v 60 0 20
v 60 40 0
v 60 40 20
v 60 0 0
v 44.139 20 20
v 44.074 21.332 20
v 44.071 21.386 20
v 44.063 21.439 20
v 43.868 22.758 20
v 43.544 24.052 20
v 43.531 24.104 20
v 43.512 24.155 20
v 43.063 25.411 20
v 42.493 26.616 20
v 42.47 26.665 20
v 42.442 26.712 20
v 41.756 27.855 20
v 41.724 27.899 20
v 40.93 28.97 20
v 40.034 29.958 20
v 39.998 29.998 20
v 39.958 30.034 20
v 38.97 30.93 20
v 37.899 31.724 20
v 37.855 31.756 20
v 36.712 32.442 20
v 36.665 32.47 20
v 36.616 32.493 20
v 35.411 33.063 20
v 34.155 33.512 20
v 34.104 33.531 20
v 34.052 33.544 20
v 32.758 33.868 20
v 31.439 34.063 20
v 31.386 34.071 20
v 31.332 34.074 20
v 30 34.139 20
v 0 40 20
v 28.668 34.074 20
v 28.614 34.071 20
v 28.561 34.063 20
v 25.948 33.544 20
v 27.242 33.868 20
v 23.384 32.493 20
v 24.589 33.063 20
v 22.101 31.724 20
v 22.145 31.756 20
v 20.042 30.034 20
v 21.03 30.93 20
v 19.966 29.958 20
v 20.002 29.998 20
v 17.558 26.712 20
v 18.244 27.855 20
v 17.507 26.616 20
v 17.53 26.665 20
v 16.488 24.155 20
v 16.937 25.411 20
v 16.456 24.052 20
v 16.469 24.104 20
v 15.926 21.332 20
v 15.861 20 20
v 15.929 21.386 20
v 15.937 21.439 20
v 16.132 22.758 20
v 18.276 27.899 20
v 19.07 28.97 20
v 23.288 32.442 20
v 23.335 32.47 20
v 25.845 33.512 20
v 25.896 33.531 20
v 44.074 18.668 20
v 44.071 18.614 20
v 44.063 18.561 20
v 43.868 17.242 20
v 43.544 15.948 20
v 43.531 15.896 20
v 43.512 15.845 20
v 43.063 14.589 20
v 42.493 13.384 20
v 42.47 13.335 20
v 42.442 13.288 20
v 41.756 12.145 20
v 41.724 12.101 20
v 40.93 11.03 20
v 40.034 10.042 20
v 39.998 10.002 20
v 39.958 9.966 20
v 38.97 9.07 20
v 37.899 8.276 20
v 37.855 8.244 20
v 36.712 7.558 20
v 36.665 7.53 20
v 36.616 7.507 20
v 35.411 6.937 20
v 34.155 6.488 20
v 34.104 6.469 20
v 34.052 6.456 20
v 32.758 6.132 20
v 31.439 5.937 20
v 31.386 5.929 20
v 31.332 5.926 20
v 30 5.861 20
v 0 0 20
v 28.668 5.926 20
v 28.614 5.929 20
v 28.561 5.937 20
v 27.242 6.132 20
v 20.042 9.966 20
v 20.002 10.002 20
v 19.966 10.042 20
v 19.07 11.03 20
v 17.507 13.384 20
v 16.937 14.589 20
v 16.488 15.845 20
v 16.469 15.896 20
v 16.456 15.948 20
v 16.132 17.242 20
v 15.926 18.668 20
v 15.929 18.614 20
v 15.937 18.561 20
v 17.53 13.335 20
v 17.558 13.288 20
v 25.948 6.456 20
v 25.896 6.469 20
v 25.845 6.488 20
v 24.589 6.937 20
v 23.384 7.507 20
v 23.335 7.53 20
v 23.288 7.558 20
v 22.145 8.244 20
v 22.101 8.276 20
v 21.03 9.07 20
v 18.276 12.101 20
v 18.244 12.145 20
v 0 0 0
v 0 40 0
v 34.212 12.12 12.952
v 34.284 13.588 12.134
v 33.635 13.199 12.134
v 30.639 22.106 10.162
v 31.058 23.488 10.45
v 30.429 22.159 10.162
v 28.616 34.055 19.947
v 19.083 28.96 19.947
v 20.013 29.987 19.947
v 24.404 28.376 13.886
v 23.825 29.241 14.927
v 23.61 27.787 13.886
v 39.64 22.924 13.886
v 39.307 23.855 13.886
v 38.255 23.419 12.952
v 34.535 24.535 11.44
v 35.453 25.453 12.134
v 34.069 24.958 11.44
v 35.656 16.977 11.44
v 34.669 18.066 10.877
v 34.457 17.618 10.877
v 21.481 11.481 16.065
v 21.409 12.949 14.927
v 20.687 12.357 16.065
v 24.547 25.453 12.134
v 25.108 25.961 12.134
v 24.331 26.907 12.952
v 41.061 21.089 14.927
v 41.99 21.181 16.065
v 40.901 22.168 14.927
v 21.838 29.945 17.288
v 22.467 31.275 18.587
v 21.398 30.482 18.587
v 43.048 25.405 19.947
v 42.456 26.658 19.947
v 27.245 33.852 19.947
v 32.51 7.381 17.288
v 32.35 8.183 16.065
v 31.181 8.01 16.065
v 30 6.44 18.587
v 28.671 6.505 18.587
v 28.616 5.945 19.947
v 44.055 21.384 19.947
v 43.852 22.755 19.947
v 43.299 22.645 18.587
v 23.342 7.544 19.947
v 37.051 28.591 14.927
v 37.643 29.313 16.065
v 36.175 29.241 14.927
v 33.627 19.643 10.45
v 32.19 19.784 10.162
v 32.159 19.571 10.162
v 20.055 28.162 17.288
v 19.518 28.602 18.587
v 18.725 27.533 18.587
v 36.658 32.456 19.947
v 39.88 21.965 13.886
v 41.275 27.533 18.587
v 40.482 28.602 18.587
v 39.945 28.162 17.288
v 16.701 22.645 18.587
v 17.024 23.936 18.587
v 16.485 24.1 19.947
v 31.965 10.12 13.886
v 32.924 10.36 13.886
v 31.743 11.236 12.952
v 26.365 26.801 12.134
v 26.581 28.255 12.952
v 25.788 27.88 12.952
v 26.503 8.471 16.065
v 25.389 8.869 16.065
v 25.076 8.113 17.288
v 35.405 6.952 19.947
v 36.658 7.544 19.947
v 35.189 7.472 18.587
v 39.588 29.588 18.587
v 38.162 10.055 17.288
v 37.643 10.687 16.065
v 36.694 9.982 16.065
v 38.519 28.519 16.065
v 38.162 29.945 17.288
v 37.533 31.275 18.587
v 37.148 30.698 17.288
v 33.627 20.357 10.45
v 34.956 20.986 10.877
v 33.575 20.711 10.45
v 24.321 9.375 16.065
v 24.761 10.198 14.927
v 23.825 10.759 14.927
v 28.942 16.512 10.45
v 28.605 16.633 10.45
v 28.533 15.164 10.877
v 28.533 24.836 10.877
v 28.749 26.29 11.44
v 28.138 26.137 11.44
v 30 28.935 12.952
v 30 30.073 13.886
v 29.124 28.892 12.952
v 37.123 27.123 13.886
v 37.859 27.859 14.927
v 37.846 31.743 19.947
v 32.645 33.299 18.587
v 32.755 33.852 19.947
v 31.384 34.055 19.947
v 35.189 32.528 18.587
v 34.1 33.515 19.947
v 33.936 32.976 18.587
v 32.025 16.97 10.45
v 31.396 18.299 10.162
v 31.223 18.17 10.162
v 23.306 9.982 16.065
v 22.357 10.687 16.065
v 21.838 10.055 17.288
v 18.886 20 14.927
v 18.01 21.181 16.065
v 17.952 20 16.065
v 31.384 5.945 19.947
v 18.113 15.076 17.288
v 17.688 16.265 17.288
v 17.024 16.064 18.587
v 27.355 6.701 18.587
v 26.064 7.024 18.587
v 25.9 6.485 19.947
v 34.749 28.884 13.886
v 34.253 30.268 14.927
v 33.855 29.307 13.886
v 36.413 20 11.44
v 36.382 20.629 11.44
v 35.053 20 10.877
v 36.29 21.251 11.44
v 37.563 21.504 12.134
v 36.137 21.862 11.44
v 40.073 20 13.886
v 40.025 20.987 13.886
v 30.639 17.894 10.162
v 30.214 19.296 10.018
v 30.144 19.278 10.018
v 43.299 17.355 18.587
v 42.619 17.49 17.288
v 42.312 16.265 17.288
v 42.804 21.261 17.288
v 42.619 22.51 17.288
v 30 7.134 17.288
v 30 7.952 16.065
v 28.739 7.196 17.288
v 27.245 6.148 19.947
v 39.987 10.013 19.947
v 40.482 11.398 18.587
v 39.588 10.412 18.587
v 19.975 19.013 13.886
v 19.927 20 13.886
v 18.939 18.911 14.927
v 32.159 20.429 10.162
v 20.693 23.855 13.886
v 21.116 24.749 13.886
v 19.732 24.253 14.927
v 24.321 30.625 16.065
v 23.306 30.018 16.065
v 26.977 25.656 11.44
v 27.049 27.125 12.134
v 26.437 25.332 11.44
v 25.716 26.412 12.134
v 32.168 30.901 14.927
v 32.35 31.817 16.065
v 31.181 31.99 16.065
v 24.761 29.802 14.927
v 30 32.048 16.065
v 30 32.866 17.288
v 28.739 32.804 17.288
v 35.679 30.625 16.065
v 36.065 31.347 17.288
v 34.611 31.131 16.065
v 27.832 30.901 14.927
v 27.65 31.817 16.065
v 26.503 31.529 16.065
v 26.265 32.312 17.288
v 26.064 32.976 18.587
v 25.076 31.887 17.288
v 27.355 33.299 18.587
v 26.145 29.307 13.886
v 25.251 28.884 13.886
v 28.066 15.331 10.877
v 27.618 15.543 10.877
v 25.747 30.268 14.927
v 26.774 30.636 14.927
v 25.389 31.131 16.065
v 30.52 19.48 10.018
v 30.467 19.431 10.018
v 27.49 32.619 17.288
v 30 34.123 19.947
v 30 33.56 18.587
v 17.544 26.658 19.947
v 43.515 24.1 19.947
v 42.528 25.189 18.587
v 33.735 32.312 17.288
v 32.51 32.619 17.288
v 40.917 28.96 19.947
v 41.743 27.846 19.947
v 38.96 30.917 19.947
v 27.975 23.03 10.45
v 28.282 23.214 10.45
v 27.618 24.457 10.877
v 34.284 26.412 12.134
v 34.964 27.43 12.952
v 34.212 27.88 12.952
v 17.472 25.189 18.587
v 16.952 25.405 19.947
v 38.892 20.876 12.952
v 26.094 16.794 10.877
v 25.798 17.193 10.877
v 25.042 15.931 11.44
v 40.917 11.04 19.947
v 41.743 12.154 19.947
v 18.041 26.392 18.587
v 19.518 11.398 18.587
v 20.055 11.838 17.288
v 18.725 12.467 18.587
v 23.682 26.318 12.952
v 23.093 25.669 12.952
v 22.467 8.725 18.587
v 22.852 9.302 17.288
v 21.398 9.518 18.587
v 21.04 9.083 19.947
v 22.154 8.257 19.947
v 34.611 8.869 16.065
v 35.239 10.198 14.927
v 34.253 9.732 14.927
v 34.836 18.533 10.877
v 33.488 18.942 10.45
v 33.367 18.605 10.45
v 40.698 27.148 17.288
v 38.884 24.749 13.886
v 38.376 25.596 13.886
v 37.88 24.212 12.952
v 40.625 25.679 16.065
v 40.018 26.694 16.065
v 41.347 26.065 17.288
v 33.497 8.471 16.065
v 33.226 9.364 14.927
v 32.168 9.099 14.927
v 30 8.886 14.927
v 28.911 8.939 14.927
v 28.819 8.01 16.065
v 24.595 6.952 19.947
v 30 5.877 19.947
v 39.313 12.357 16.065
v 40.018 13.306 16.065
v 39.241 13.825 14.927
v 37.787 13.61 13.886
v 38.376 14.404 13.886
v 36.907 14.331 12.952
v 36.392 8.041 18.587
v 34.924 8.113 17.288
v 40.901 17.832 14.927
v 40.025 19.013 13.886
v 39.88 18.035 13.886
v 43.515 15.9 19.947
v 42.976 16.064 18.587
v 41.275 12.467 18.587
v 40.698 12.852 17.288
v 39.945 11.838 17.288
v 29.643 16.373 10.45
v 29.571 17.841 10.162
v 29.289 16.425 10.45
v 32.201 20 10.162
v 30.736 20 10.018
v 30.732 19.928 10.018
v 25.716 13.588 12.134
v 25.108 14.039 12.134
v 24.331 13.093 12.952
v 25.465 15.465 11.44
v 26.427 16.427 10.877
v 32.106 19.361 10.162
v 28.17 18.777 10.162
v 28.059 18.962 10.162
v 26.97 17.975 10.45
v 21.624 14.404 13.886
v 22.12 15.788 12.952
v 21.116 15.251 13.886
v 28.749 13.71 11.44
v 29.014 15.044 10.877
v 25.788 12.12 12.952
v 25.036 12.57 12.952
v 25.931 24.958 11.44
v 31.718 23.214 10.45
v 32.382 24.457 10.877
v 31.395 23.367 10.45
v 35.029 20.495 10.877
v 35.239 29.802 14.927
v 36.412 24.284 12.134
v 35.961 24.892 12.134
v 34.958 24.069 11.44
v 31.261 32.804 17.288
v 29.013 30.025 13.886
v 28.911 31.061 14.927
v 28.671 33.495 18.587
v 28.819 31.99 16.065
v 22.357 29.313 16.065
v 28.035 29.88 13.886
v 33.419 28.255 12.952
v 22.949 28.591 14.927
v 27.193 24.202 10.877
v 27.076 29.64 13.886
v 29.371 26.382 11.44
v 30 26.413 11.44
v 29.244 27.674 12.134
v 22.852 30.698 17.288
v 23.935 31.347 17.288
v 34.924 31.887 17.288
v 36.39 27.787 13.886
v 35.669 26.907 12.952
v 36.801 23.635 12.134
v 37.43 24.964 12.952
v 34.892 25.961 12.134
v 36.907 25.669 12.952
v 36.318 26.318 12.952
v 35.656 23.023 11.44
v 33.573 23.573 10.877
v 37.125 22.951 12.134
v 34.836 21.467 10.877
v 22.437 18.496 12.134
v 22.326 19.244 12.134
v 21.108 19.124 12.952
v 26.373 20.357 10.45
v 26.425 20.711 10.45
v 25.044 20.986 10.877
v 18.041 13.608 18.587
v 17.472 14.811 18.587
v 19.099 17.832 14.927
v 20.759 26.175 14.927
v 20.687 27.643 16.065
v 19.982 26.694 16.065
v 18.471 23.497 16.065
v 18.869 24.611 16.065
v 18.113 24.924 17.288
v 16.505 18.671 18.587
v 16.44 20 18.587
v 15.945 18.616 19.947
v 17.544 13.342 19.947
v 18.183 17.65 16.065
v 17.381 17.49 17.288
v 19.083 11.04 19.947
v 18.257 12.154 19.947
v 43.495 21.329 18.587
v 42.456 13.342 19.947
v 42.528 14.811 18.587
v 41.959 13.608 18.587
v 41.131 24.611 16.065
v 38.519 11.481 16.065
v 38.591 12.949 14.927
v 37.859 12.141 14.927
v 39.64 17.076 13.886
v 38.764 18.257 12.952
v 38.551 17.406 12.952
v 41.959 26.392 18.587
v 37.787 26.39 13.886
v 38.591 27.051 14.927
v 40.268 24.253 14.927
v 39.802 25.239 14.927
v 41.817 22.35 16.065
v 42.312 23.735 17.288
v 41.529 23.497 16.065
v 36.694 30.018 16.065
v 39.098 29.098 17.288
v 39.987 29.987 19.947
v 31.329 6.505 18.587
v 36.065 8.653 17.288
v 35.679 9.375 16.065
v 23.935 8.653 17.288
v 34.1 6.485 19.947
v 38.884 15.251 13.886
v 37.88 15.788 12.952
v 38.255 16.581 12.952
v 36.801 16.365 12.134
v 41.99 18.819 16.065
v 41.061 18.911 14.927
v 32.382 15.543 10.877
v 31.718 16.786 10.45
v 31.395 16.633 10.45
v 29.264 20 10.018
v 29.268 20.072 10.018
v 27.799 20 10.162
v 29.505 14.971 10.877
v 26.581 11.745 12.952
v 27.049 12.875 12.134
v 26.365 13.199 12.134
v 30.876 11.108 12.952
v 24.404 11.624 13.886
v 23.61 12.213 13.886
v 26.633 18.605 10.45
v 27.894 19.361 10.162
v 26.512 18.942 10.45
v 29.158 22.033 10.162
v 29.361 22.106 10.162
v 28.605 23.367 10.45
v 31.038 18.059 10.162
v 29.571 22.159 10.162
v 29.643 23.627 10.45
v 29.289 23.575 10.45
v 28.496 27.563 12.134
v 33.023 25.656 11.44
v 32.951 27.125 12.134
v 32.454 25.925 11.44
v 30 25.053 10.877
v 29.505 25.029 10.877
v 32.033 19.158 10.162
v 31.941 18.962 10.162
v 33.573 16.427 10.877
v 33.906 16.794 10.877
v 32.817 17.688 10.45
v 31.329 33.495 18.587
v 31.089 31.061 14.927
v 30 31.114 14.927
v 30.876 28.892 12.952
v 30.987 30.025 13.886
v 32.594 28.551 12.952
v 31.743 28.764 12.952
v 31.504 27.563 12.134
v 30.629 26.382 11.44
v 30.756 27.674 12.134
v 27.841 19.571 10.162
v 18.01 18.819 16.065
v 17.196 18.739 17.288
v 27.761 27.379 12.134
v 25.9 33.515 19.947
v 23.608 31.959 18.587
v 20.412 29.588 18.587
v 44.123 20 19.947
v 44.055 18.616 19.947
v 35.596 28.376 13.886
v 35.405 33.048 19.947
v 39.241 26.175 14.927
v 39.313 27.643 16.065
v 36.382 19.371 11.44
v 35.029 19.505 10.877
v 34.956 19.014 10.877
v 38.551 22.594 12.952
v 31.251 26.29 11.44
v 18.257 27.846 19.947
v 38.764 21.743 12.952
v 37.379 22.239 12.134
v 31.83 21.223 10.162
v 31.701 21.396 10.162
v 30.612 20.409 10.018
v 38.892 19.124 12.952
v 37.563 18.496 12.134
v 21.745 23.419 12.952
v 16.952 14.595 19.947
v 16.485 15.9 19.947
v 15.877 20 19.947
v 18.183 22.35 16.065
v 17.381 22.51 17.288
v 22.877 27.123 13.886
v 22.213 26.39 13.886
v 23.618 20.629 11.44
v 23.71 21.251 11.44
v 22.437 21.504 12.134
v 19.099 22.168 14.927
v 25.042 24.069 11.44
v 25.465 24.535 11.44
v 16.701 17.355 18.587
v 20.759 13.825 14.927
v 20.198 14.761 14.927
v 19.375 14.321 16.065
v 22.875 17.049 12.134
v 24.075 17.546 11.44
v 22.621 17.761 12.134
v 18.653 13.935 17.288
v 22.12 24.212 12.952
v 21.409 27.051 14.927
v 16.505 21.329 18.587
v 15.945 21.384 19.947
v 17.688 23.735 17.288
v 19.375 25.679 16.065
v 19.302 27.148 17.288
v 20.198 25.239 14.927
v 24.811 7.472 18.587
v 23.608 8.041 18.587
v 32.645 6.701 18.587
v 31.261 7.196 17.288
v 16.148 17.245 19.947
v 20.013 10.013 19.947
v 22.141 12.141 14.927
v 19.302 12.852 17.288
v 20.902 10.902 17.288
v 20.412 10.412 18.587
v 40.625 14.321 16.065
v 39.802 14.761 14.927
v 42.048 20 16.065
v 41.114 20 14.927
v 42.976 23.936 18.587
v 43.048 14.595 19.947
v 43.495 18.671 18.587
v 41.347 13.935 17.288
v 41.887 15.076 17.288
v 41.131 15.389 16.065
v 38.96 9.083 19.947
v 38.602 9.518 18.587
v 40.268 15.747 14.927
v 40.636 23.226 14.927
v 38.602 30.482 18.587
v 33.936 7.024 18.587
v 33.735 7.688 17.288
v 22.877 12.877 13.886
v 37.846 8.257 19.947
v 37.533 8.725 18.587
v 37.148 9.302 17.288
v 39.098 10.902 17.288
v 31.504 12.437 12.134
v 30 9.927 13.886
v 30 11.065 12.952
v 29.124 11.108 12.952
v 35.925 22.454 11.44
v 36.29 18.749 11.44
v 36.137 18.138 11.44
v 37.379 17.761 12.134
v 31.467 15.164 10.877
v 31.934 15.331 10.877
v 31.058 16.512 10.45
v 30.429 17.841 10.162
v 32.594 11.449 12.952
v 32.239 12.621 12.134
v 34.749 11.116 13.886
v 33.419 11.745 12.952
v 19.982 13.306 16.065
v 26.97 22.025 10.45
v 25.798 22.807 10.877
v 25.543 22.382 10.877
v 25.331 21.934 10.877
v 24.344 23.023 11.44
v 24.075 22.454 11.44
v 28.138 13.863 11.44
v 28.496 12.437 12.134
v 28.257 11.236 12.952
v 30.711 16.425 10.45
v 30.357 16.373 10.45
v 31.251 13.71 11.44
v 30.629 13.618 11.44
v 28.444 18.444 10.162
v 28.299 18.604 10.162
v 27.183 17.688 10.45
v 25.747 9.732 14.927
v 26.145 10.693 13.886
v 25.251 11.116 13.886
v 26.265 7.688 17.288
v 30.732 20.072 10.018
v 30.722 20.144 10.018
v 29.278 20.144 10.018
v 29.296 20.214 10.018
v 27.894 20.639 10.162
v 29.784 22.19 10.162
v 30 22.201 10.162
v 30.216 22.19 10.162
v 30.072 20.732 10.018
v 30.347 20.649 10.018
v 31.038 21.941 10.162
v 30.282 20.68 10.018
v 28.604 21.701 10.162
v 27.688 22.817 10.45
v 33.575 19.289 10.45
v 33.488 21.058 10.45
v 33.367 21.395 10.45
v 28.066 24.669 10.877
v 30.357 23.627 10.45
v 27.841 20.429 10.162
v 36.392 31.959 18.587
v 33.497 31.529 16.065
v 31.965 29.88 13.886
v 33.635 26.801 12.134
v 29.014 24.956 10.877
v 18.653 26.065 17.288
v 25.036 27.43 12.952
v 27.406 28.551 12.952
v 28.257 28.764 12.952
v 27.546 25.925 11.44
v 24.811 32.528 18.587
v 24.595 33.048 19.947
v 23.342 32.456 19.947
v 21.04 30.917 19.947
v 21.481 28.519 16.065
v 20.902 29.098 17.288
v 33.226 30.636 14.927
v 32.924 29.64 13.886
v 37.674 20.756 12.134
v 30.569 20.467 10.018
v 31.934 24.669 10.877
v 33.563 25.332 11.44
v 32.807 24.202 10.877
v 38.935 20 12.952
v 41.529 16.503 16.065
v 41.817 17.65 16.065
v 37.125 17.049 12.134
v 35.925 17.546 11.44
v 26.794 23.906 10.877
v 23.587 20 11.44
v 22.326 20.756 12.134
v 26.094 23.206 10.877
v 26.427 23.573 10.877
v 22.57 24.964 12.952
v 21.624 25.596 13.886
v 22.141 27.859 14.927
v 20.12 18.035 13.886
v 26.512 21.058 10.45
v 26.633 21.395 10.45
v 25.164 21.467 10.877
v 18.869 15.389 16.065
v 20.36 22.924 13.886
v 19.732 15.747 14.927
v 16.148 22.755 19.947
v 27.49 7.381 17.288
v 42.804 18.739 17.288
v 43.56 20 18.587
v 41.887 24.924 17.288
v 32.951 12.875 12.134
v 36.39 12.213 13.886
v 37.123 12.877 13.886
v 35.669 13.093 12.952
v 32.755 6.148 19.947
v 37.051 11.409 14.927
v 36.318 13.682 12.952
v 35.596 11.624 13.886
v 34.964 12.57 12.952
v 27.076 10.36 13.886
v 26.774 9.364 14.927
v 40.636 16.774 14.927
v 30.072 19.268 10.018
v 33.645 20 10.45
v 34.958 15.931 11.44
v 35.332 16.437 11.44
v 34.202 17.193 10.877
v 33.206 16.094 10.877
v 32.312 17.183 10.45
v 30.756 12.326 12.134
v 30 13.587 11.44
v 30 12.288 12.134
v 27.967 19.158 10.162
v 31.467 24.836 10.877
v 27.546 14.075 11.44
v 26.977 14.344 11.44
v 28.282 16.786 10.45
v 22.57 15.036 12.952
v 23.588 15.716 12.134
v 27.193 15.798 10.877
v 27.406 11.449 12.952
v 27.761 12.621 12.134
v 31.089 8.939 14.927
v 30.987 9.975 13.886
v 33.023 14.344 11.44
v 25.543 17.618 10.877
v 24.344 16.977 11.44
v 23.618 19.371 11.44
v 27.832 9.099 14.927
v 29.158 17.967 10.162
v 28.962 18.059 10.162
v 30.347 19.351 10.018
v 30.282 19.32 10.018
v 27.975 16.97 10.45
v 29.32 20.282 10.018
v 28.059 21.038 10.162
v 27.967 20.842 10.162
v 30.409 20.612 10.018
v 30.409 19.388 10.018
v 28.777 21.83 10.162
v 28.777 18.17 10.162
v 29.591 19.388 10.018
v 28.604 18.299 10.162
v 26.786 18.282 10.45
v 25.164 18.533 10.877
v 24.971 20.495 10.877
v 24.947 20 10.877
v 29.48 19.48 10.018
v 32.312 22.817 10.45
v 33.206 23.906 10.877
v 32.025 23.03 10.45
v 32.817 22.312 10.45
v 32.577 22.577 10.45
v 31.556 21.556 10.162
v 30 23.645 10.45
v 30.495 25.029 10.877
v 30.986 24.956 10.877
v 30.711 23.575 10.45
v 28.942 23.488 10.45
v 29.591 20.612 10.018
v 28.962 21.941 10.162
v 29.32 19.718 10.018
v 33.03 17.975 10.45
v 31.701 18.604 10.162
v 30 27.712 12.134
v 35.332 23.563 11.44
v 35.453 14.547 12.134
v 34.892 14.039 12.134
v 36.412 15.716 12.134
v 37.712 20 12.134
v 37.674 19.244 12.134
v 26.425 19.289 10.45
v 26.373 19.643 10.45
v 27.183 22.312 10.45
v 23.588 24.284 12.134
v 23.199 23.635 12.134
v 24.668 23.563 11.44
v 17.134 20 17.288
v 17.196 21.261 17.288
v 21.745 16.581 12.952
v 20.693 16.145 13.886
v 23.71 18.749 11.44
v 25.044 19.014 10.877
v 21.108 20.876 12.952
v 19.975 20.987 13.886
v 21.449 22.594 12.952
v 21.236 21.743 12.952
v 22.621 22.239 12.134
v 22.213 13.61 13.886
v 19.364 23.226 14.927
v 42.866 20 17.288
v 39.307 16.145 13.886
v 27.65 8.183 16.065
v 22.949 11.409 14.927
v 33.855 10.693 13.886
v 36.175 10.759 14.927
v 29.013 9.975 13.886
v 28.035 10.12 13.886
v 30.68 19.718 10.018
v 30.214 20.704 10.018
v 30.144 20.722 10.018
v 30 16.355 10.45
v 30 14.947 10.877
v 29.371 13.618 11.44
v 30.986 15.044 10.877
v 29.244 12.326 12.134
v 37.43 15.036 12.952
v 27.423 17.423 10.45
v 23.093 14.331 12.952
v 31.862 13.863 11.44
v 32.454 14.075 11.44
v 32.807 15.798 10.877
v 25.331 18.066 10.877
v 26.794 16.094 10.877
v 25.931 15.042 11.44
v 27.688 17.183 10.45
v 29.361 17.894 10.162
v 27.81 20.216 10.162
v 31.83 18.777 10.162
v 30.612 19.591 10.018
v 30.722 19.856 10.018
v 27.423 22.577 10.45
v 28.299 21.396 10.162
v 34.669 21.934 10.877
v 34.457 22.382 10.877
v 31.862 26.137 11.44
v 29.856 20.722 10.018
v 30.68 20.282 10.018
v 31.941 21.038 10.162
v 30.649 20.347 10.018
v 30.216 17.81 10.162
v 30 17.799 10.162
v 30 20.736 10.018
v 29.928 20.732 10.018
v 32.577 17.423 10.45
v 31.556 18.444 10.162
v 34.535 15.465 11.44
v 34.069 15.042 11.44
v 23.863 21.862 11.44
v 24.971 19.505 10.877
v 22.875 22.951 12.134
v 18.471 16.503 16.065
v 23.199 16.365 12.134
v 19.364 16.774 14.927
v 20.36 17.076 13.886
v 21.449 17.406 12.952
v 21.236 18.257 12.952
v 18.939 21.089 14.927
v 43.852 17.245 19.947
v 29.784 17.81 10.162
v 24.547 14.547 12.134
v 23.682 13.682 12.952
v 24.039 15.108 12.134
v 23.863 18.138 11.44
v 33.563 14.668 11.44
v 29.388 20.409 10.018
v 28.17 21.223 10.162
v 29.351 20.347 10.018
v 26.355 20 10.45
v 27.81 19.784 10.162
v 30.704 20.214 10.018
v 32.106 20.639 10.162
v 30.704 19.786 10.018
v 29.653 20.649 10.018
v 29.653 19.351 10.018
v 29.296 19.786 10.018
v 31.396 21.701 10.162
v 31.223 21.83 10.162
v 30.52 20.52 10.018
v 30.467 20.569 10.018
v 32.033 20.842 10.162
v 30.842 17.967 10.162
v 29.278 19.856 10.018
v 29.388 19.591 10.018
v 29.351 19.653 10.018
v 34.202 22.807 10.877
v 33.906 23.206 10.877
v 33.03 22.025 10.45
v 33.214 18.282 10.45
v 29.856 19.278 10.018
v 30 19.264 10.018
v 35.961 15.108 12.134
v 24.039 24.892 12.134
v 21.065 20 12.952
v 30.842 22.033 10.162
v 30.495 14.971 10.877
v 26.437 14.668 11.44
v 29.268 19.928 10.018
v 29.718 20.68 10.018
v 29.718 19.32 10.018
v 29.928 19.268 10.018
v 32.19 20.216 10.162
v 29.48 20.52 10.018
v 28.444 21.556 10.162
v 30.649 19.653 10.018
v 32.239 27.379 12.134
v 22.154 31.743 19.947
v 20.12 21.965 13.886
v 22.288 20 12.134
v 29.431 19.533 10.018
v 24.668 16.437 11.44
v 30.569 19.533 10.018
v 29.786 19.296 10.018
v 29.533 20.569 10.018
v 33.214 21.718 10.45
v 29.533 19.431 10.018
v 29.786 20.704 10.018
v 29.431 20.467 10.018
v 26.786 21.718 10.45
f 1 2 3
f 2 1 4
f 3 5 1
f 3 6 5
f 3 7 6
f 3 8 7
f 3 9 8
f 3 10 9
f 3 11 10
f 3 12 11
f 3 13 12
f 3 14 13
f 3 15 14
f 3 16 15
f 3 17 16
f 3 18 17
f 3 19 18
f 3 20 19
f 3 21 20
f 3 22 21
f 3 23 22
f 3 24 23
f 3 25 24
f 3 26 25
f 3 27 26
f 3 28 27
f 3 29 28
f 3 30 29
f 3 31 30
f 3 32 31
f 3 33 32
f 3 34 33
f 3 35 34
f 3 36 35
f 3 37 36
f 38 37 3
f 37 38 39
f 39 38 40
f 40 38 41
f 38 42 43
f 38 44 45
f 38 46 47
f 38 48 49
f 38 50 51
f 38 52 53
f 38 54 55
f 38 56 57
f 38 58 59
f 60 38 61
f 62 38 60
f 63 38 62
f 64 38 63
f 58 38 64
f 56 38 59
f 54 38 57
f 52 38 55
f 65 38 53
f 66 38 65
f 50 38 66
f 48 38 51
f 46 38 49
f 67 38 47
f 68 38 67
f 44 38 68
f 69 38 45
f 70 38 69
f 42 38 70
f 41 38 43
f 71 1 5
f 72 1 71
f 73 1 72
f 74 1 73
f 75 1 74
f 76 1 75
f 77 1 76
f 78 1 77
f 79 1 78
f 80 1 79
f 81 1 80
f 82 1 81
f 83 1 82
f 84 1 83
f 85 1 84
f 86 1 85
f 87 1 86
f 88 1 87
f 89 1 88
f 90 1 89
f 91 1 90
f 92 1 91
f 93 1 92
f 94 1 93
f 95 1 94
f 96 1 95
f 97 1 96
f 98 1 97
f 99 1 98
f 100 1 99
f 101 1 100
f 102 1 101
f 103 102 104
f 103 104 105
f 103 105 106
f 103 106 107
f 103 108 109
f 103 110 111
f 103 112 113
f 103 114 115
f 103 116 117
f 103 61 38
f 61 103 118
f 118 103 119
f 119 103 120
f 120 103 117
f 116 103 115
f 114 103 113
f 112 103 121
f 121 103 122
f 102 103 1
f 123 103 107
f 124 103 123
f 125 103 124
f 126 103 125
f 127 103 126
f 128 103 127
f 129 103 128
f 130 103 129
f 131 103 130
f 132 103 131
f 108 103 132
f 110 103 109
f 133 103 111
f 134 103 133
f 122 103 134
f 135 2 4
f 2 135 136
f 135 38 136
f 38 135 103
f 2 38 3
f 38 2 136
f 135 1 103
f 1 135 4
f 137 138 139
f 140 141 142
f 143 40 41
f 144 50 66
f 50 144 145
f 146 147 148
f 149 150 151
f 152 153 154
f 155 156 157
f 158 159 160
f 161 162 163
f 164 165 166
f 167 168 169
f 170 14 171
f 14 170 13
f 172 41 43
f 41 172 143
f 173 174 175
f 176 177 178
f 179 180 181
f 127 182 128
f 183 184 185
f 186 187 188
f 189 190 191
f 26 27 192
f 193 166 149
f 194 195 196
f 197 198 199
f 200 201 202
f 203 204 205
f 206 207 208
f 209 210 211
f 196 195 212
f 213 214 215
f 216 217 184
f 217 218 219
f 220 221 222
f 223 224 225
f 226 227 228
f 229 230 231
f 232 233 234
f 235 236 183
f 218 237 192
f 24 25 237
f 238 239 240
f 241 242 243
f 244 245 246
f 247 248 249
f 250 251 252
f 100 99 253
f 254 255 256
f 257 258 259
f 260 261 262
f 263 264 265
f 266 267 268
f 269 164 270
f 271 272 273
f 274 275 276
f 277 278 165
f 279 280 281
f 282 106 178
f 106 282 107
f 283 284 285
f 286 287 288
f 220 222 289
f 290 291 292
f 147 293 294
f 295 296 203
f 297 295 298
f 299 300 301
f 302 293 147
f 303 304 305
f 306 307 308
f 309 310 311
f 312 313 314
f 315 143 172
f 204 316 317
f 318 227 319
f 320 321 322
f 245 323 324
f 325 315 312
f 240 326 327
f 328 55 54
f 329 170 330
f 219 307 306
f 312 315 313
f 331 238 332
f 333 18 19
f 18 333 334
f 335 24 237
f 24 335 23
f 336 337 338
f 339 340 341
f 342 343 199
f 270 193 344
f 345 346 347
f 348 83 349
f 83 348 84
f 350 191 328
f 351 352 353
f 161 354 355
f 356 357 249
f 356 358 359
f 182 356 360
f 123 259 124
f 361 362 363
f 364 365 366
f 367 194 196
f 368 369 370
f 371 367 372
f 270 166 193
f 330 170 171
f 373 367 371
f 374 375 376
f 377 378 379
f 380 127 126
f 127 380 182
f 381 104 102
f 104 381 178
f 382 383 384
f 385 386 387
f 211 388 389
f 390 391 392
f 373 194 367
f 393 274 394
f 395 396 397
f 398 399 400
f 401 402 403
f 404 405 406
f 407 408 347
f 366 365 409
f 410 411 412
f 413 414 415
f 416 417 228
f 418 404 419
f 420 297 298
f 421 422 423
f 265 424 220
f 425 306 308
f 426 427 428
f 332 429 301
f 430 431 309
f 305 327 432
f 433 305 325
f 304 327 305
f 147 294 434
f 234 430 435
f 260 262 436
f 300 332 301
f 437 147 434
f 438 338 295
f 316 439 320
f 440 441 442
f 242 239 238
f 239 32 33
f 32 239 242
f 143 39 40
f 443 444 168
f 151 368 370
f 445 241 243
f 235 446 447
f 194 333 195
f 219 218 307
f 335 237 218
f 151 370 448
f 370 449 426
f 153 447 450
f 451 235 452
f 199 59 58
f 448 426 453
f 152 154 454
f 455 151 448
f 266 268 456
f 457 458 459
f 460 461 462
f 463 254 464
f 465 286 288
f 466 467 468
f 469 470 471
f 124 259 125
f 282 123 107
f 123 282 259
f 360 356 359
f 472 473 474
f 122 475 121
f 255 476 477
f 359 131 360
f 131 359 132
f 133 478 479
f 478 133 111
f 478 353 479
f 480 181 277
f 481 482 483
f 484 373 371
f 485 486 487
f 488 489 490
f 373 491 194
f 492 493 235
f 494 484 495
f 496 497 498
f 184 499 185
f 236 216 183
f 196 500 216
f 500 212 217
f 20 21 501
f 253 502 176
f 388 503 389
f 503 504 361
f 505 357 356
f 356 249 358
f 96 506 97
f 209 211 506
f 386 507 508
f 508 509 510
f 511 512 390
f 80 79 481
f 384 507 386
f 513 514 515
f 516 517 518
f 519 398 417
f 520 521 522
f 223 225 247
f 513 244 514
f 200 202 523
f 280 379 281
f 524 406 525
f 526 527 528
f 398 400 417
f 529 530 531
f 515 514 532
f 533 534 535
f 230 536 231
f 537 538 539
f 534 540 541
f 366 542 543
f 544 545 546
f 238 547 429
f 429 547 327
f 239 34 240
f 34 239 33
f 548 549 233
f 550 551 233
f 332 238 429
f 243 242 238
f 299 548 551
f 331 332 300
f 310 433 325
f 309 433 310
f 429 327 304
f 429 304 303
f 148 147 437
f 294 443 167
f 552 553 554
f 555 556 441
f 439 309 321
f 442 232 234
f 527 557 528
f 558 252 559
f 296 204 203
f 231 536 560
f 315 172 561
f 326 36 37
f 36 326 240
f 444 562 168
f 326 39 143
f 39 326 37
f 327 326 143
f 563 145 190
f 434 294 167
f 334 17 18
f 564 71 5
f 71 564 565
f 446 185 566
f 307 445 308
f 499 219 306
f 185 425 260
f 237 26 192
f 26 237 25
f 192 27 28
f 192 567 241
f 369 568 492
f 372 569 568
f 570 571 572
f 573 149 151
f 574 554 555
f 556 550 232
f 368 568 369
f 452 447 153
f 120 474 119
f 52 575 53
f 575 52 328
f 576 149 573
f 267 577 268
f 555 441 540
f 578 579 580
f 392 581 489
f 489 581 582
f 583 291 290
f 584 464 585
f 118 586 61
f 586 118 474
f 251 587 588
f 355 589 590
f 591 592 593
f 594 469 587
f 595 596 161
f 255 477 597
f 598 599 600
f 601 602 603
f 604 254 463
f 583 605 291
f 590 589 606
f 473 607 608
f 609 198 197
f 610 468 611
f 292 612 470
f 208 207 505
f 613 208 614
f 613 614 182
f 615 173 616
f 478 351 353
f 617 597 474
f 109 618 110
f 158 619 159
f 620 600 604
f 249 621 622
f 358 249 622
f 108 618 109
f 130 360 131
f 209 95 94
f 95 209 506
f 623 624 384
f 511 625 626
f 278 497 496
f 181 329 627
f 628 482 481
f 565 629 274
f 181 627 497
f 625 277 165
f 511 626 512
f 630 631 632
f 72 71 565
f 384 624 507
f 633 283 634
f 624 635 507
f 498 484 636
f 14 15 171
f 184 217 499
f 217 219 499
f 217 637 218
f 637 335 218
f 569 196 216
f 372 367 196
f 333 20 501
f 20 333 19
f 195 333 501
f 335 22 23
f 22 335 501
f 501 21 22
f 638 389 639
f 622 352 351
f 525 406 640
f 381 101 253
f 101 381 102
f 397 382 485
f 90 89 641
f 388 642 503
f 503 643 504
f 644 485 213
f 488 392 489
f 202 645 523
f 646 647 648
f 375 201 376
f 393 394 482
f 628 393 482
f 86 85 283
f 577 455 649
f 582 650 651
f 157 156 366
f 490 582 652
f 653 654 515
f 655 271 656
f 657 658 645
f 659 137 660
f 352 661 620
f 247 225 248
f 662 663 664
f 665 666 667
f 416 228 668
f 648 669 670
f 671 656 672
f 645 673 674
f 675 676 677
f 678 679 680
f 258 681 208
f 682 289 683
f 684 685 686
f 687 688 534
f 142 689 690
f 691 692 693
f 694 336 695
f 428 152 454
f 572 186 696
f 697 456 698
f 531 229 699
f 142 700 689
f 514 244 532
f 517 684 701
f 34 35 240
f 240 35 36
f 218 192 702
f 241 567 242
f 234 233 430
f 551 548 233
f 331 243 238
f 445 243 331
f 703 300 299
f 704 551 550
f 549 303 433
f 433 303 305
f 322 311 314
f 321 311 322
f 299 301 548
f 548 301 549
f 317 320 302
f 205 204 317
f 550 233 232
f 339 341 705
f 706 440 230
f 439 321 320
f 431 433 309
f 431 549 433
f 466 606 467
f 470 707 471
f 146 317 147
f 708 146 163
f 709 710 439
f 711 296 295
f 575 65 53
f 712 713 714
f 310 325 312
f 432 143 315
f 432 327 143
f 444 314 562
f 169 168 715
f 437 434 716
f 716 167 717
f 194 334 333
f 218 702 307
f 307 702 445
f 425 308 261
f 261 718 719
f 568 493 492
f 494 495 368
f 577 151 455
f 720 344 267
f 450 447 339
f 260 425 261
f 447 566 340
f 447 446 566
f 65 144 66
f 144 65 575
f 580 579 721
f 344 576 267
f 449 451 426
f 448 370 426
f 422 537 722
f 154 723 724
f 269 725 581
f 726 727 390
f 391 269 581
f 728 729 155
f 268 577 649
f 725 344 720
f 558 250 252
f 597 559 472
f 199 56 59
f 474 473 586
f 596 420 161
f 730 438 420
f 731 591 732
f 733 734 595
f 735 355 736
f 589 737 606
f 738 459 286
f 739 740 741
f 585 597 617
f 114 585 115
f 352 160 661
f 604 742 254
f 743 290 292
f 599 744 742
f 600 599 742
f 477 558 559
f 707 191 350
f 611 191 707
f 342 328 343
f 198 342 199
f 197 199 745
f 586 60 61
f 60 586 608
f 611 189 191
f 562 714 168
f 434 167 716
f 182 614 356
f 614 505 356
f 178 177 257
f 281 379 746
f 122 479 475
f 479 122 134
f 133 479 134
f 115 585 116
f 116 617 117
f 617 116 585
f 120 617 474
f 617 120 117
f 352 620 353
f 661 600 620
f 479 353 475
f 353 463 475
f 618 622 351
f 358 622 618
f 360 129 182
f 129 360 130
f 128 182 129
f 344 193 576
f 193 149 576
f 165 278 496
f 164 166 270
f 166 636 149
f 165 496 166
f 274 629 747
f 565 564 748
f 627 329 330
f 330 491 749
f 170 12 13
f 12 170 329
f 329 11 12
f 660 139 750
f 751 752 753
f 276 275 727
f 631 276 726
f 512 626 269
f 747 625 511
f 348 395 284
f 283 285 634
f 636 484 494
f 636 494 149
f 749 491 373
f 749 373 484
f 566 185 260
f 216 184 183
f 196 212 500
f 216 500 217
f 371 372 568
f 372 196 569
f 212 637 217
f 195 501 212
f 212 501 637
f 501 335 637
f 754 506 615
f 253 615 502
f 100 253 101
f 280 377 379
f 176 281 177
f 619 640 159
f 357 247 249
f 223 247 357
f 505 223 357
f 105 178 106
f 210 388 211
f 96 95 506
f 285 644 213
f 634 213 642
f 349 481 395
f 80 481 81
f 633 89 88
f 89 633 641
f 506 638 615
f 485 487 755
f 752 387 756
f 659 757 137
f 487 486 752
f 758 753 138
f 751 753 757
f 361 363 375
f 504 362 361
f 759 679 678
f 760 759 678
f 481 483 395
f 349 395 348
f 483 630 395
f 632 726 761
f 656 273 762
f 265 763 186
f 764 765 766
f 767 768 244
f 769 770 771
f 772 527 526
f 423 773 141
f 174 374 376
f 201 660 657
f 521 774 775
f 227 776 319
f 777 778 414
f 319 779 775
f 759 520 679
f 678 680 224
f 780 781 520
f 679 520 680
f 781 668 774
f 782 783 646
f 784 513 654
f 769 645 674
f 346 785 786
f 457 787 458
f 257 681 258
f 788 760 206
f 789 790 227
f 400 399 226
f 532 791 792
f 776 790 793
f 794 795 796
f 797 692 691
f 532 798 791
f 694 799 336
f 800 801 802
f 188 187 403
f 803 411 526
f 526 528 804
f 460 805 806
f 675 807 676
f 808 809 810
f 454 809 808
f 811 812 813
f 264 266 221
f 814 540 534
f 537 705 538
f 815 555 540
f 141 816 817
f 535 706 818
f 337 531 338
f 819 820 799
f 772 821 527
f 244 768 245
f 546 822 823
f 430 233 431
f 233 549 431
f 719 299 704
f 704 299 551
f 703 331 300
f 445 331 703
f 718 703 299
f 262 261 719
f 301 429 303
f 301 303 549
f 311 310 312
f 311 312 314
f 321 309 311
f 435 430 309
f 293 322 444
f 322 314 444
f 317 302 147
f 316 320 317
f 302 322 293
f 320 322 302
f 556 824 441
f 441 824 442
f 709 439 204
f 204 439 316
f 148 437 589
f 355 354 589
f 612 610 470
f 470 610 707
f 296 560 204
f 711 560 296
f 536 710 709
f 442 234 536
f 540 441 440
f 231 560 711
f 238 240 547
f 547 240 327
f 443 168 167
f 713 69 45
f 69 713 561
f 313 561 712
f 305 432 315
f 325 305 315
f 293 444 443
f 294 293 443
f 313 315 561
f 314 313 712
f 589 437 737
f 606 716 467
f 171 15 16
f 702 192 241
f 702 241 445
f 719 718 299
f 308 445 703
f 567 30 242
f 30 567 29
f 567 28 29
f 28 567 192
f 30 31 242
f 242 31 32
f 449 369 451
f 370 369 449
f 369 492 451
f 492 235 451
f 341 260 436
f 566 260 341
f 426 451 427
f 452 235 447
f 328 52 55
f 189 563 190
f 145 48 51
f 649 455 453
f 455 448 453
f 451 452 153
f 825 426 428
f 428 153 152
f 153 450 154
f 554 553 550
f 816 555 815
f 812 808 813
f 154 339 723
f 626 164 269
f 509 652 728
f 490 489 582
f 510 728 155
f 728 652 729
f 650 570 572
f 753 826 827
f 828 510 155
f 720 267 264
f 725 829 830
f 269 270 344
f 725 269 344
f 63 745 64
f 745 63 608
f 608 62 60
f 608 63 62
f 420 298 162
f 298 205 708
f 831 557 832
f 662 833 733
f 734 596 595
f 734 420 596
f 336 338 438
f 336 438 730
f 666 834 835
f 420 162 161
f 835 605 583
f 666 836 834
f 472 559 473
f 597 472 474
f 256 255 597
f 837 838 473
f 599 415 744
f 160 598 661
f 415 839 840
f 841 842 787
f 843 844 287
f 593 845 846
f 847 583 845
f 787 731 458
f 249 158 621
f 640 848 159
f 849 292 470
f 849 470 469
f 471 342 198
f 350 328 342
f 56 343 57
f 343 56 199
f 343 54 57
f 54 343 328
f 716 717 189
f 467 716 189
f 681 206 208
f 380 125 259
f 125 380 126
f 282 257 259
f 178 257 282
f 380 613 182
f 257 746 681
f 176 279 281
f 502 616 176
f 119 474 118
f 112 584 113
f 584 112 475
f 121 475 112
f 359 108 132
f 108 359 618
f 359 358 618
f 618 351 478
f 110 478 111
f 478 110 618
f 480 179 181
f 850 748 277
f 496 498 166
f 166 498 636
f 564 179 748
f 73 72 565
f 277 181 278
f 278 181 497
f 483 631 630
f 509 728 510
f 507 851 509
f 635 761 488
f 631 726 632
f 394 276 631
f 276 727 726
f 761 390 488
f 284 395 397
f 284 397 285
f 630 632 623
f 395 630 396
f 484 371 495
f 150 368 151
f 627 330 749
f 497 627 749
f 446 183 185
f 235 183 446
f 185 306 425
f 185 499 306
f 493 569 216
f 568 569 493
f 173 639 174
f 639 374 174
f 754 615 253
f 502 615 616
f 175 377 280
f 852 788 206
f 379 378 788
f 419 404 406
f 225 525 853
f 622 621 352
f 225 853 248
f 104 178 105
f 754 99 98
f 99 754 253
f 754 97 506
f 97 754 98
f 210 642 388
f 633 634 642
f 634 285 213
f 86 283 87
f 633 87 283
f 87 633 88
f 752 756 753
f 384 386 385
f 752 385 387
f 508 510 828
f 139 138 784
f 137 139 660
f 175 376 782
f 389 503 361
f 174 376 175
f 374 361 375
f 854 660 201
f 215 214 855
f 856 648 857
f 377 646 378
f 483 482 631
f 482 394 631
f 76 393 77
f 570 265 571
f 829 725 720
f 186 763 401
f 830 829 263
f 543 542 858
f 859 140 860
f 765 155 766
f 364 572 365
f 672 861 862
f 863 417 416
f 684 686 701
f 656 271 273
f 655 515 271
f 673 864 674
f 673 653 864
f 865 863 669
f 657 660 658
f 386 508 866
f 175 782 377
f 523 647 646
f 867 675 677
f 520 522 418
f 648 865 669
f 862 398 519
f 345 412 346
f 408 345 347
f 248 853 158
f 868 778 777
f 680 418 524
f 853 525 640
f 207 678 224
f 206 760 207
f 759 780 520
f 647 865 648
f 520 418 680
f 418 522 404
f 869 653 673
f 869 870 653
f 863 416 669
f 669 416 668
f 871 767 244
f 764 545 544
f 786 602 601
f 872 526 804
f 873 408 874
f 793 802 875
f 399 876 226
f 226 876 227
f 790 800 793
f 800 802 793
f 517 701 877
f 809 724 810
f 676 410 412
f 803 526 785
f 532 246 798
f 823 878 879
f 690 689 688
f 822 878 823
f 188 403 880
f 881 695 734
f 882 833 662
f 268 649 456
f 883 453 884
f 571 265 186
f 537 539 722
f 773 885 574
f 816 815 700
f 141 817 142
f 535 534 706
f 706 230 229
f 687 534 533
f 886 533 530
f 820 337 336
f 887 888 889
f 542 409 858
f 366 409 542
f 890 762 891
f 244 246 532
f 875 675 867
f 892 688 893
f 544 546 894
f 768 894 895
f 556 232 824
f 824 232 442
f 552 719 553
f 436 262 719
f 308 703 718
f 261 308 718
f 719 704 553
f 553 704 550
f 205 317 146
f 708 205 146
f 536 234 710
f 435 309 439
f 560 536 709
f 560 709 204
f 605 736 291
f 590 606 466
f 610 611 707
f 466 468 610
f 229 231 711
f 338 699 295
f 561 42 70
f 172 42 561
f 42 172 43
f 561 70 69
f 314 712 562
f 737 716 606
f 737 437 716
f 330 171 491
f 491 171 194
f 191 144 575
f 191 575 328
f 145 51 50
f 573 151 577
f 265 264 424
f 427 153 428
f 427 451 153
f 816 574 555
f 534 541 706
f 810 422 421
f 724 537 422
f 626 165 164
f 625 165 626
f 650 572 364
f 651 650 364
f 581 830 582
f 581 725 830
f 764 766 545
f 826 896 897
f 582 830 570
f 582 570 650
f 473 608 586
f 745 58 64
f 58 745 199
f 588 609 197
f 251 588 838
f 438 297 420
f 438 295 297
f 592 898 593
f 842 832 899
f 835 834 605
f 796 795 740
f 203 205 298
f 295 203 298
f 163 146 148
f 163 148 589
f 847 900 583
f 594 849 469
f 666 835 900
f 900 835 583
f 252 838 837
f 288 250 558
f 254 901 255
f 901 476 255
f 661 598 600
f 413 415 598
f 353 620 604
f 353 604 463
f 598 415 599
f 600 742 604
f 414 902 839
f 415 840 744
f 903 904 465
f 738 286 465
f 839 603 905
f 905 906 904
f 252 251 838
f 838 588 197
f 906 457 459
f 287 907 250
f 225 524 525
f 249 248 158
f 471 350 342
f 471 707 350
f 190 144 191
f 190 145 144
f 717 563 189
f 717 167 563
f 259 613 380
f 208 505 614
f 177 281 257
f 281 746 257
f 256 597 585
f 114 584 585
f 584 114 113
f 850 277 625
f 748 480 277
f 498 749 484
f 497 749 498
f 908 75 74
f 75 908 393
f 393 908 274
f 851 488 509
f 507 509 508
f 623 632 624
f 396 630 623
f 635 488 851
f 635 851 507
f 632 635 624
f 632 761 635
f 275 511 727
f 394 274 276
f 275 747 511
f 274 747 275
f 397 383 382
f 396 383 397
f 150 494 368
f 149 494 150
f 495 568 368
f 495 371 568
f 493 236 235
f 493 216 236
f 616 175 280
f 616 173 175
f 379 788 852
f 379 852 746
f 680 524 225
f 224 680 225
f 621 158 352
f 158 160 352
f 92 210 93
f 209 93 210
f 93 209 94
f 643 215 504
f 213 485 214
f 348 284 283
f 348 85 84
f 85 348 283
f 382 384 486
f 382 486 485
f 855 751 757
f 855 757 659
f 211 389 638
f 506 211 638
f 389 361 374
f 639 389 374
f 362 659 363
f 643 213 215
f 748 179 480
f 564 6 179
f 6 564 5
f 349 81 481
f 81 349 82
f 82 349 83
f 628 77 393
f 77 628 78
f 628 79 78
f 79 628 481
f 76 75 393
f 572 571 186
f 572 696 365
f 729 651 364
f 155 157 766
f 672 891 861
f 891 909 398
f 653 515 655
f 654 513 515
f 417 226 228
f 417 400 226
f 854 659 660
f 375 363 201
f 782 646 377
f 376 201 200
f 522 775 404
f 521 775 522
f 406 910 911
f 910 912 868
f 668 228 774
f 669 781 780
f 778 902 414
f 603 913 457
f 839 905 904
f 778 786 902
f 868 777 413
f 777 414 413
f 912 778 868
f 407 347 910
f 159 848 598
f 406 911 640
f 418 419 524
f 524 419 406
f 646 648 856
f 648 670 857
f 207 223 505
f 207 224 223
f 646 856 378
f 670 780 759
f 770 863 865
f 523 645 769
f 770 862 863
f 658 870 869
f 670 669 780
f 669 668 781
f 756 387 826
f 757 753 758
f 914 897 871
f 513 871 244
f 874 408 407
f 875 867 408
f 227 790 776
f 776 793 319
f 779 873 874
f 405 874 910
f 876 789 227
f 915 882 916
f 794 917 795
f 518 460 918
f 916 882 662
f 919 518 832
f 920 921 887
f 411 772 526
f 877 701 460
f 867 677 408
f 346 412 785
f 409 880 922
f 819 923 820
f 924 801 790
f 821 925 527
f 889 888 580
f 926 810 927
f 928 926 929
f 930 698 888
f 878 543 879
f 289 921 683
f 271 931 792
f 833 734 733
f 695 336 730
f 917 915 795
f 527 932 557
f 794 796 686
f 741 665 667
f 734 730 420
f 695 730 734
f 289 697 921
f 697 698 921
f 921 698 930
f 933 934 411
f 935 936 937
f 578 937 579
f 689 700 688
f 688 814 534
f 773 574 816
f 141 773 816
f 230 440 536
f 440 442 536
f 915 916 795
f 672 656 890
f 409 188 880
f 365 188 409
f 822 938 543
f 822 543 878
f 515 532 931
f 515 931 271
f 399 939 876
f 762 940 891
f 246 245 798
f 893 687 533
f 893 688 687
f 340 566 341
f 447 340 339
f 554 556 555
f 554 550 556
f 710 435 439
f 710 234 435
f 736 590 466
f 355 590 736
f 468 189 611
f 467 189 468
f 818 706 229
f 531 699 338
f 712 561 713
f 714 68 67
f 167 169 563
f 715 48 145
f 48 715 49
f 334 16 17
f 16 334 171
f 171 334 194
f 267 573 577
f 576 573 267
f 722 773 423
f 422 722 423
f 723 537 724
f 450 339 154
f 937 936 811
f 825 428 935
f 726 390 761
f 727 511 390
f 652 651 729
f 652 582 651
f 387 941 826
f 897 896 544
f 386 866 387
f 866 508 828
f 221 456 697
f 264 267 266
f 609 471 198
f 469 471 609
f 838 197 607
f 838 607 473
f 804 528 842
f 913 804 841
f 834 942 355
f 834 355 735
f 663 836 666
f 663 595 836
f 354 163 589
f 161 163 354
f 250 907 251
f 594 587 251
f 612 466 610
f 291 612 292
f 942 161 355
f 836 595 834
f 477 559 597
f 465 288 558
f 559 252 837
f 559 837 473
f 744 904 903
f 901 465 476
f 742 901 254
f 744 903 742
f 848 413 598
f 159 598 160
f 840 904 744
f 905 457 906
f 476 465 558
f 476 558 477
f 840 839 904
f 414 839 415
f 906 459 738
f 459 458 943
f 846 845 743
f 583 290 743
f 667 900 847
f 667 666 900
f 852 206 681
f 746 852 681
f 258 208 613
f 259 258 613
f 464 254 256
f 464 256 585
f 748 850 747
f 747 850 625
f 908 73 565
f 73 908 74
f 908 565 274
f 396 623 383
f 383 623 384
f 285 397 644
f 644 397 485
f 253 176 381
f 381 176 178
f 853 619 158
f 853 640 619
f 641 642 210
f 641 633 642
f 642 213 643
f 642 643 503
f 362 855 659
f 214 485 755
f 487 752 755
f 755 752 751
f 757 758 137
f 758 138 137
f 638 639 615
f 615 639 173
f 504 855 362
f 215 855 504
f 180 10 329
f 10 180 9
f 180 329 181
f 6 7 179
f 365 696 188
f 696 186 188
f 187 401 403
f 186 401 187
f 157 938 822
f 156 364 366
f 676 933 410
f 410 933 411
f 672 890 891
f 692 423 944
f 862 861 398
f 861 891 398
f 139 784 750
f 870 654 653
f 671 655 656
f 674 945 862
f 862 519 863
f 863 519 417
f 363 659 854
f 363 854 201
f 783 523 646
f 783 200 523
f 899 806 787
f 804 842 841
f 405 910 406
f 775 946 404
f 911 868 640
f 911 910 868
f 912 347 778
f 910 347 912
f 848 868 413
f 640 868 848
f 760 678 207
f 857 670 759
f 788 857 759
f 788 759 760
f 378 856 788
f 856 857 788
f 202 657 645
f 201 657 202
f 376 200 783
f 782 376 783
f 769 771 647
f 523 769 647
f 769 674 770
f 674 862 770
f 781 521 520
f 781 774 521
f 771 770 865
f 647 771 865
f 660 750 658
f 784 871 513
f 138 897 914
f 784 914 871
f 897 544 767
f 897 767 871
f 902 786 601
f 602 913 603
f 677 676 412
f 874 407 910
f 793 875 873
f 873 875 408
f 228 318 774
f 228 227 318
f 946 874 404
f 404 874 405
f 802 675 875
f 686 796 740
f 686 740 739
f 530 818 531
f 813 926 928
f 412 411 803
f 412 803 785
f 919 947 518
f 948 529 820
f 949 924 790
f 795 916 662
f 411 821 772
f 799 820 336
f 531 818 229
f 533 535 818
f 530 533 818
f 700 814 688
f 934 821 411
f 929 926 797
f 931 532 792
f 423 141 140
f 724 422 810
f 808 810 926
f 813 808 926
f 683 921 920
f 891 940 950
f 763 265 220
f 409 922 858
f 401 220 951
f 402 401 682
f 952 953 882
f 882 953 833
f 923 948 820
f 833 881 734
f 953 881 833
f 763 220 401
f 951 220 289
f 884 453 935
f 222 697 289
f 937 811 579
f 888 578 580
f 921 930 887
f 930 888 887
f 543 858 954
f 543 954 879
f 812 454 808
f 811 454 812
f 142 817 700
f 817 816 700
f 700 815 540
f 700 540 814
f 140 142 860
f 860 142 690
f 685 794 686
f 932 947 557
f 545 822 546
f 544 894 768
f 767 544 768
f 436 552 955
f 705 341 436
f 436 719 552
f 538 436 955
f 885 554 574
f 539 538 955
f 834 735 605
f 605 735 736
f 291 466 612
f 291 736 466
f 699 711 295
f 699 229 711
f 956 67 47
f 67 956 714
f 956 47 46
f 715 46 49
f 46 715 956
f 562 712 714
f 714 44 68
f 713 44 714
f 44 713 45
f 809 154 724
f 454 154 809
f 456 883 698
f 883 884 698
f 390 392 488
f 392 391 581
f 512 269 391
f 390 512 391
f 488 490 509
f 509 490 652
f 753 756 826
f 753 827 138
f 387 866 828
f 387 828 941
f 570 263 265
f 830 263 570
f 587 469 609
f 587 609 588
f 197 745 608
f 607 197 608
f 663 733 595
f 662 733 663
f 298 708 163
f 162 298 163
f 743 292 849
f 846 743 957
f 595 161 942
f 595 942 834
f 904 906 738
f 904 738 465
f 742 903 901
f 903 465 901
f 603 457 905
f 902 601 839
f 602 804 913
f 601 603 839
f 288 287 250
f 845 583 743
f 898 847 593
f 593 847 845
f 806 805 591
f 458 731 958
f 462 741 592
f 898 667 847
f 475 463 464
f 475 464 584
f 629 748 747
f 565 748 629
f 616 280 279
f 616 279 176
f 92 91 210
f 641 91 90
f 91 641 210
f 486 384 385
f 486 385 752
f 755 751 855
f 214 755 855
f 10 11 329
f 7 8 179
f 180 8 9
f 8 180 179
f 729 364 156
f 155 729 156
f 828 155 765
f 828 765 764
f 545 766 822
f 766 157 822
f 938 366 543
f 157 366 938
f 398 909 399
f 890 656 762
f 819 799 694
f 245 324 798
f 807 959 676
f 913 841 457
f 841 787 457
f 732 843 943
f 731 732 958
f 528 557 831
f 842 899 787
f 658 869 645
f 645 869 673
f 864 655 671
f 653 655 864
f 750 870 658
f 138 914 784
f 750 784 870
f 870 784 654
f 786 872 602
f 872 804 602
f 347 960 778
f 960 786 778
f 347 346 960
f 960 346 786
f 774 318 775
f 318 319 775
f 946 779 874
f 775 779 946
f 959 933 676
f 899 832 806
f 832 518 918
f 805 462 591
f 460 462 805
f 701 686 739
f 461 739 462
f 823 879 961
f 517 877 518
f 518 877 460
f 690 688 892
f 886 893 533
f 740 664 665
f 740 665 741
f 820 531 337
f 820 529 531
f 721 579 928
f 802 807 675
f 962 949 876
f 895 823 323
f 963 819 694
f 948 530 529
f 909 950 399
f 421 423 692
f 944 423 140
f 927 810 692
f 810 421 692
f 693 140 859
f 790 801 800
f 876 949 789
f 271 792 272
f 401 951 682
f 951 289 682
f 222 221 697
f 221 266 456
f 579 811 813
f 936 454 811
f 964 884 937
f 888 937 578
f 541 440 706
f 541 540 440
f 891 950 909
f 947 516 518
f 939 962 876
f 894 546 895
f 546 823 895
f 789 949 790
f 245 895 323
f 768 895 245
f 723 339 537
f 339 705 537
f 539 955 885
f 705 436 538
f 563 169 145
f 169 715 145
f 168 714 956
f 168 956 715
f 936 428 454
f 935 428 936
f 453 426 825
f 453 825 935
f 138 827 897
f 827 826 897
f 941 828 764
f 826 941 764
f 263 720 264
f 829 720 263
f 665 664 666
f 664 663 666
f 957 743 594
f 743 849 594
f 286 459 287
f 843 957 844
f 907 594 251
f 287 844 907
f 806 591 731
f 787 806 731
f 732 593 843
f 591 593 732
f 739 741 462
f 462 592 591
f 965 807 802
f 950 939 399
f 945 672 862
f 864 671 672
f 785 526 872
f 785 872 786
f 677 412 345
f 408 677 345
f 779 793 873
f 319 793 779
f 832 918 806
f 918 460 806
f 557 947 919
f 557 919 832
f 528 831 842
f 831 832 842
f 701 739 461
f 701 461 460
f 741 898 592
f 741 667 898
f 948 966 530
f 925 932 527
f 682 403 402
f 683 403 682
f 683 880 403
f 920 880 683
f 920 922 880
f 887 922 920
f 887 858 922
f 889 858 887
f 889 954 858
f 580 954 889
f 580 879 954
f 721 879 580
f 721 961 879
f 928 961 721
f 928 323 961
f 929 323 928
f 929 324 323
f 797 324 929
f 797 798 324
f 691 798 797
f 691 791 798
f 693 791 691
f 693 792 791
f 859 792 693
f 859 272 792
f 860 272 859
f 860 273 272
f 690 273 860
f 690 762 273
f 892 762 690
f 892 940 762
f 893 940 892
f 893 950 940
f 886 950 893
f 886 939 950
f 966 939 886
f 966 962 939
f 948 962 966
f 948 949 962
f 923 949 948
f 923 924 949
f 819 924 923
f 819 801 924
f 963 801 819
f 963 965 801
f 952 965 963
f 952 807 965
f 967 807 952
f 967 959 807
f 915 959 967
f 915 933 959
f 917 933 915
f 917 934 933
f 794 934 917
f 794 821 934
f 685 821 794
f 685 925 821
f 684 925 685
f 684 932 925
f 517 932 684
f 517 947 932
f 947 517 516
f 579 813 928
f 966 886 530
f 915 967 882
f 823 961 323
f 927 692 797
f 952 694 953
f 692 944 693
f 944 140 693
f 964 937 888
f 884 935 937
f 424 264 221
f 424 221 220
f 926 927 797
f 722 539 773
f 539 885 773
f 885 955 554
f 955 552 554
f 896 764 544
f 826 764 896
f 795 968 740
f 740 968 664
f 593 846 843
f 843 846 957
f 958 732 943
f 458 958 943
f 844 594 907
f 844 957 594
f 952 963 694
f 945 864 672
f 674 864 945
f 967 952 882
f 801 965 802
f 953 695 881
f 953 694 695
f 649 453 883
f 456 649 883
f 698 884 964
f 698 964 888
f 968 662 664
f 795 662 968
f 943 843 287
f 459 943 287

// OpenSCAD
// Block with a spherical cut-out.
$fn = 64;
block = [60, 40, 20];
sphere_d = 30;

difference() {
    cube(block);
    translate([block[0]/2, block[1]/2, block[2] + 5]) sphere(d = sphere_d);
}
